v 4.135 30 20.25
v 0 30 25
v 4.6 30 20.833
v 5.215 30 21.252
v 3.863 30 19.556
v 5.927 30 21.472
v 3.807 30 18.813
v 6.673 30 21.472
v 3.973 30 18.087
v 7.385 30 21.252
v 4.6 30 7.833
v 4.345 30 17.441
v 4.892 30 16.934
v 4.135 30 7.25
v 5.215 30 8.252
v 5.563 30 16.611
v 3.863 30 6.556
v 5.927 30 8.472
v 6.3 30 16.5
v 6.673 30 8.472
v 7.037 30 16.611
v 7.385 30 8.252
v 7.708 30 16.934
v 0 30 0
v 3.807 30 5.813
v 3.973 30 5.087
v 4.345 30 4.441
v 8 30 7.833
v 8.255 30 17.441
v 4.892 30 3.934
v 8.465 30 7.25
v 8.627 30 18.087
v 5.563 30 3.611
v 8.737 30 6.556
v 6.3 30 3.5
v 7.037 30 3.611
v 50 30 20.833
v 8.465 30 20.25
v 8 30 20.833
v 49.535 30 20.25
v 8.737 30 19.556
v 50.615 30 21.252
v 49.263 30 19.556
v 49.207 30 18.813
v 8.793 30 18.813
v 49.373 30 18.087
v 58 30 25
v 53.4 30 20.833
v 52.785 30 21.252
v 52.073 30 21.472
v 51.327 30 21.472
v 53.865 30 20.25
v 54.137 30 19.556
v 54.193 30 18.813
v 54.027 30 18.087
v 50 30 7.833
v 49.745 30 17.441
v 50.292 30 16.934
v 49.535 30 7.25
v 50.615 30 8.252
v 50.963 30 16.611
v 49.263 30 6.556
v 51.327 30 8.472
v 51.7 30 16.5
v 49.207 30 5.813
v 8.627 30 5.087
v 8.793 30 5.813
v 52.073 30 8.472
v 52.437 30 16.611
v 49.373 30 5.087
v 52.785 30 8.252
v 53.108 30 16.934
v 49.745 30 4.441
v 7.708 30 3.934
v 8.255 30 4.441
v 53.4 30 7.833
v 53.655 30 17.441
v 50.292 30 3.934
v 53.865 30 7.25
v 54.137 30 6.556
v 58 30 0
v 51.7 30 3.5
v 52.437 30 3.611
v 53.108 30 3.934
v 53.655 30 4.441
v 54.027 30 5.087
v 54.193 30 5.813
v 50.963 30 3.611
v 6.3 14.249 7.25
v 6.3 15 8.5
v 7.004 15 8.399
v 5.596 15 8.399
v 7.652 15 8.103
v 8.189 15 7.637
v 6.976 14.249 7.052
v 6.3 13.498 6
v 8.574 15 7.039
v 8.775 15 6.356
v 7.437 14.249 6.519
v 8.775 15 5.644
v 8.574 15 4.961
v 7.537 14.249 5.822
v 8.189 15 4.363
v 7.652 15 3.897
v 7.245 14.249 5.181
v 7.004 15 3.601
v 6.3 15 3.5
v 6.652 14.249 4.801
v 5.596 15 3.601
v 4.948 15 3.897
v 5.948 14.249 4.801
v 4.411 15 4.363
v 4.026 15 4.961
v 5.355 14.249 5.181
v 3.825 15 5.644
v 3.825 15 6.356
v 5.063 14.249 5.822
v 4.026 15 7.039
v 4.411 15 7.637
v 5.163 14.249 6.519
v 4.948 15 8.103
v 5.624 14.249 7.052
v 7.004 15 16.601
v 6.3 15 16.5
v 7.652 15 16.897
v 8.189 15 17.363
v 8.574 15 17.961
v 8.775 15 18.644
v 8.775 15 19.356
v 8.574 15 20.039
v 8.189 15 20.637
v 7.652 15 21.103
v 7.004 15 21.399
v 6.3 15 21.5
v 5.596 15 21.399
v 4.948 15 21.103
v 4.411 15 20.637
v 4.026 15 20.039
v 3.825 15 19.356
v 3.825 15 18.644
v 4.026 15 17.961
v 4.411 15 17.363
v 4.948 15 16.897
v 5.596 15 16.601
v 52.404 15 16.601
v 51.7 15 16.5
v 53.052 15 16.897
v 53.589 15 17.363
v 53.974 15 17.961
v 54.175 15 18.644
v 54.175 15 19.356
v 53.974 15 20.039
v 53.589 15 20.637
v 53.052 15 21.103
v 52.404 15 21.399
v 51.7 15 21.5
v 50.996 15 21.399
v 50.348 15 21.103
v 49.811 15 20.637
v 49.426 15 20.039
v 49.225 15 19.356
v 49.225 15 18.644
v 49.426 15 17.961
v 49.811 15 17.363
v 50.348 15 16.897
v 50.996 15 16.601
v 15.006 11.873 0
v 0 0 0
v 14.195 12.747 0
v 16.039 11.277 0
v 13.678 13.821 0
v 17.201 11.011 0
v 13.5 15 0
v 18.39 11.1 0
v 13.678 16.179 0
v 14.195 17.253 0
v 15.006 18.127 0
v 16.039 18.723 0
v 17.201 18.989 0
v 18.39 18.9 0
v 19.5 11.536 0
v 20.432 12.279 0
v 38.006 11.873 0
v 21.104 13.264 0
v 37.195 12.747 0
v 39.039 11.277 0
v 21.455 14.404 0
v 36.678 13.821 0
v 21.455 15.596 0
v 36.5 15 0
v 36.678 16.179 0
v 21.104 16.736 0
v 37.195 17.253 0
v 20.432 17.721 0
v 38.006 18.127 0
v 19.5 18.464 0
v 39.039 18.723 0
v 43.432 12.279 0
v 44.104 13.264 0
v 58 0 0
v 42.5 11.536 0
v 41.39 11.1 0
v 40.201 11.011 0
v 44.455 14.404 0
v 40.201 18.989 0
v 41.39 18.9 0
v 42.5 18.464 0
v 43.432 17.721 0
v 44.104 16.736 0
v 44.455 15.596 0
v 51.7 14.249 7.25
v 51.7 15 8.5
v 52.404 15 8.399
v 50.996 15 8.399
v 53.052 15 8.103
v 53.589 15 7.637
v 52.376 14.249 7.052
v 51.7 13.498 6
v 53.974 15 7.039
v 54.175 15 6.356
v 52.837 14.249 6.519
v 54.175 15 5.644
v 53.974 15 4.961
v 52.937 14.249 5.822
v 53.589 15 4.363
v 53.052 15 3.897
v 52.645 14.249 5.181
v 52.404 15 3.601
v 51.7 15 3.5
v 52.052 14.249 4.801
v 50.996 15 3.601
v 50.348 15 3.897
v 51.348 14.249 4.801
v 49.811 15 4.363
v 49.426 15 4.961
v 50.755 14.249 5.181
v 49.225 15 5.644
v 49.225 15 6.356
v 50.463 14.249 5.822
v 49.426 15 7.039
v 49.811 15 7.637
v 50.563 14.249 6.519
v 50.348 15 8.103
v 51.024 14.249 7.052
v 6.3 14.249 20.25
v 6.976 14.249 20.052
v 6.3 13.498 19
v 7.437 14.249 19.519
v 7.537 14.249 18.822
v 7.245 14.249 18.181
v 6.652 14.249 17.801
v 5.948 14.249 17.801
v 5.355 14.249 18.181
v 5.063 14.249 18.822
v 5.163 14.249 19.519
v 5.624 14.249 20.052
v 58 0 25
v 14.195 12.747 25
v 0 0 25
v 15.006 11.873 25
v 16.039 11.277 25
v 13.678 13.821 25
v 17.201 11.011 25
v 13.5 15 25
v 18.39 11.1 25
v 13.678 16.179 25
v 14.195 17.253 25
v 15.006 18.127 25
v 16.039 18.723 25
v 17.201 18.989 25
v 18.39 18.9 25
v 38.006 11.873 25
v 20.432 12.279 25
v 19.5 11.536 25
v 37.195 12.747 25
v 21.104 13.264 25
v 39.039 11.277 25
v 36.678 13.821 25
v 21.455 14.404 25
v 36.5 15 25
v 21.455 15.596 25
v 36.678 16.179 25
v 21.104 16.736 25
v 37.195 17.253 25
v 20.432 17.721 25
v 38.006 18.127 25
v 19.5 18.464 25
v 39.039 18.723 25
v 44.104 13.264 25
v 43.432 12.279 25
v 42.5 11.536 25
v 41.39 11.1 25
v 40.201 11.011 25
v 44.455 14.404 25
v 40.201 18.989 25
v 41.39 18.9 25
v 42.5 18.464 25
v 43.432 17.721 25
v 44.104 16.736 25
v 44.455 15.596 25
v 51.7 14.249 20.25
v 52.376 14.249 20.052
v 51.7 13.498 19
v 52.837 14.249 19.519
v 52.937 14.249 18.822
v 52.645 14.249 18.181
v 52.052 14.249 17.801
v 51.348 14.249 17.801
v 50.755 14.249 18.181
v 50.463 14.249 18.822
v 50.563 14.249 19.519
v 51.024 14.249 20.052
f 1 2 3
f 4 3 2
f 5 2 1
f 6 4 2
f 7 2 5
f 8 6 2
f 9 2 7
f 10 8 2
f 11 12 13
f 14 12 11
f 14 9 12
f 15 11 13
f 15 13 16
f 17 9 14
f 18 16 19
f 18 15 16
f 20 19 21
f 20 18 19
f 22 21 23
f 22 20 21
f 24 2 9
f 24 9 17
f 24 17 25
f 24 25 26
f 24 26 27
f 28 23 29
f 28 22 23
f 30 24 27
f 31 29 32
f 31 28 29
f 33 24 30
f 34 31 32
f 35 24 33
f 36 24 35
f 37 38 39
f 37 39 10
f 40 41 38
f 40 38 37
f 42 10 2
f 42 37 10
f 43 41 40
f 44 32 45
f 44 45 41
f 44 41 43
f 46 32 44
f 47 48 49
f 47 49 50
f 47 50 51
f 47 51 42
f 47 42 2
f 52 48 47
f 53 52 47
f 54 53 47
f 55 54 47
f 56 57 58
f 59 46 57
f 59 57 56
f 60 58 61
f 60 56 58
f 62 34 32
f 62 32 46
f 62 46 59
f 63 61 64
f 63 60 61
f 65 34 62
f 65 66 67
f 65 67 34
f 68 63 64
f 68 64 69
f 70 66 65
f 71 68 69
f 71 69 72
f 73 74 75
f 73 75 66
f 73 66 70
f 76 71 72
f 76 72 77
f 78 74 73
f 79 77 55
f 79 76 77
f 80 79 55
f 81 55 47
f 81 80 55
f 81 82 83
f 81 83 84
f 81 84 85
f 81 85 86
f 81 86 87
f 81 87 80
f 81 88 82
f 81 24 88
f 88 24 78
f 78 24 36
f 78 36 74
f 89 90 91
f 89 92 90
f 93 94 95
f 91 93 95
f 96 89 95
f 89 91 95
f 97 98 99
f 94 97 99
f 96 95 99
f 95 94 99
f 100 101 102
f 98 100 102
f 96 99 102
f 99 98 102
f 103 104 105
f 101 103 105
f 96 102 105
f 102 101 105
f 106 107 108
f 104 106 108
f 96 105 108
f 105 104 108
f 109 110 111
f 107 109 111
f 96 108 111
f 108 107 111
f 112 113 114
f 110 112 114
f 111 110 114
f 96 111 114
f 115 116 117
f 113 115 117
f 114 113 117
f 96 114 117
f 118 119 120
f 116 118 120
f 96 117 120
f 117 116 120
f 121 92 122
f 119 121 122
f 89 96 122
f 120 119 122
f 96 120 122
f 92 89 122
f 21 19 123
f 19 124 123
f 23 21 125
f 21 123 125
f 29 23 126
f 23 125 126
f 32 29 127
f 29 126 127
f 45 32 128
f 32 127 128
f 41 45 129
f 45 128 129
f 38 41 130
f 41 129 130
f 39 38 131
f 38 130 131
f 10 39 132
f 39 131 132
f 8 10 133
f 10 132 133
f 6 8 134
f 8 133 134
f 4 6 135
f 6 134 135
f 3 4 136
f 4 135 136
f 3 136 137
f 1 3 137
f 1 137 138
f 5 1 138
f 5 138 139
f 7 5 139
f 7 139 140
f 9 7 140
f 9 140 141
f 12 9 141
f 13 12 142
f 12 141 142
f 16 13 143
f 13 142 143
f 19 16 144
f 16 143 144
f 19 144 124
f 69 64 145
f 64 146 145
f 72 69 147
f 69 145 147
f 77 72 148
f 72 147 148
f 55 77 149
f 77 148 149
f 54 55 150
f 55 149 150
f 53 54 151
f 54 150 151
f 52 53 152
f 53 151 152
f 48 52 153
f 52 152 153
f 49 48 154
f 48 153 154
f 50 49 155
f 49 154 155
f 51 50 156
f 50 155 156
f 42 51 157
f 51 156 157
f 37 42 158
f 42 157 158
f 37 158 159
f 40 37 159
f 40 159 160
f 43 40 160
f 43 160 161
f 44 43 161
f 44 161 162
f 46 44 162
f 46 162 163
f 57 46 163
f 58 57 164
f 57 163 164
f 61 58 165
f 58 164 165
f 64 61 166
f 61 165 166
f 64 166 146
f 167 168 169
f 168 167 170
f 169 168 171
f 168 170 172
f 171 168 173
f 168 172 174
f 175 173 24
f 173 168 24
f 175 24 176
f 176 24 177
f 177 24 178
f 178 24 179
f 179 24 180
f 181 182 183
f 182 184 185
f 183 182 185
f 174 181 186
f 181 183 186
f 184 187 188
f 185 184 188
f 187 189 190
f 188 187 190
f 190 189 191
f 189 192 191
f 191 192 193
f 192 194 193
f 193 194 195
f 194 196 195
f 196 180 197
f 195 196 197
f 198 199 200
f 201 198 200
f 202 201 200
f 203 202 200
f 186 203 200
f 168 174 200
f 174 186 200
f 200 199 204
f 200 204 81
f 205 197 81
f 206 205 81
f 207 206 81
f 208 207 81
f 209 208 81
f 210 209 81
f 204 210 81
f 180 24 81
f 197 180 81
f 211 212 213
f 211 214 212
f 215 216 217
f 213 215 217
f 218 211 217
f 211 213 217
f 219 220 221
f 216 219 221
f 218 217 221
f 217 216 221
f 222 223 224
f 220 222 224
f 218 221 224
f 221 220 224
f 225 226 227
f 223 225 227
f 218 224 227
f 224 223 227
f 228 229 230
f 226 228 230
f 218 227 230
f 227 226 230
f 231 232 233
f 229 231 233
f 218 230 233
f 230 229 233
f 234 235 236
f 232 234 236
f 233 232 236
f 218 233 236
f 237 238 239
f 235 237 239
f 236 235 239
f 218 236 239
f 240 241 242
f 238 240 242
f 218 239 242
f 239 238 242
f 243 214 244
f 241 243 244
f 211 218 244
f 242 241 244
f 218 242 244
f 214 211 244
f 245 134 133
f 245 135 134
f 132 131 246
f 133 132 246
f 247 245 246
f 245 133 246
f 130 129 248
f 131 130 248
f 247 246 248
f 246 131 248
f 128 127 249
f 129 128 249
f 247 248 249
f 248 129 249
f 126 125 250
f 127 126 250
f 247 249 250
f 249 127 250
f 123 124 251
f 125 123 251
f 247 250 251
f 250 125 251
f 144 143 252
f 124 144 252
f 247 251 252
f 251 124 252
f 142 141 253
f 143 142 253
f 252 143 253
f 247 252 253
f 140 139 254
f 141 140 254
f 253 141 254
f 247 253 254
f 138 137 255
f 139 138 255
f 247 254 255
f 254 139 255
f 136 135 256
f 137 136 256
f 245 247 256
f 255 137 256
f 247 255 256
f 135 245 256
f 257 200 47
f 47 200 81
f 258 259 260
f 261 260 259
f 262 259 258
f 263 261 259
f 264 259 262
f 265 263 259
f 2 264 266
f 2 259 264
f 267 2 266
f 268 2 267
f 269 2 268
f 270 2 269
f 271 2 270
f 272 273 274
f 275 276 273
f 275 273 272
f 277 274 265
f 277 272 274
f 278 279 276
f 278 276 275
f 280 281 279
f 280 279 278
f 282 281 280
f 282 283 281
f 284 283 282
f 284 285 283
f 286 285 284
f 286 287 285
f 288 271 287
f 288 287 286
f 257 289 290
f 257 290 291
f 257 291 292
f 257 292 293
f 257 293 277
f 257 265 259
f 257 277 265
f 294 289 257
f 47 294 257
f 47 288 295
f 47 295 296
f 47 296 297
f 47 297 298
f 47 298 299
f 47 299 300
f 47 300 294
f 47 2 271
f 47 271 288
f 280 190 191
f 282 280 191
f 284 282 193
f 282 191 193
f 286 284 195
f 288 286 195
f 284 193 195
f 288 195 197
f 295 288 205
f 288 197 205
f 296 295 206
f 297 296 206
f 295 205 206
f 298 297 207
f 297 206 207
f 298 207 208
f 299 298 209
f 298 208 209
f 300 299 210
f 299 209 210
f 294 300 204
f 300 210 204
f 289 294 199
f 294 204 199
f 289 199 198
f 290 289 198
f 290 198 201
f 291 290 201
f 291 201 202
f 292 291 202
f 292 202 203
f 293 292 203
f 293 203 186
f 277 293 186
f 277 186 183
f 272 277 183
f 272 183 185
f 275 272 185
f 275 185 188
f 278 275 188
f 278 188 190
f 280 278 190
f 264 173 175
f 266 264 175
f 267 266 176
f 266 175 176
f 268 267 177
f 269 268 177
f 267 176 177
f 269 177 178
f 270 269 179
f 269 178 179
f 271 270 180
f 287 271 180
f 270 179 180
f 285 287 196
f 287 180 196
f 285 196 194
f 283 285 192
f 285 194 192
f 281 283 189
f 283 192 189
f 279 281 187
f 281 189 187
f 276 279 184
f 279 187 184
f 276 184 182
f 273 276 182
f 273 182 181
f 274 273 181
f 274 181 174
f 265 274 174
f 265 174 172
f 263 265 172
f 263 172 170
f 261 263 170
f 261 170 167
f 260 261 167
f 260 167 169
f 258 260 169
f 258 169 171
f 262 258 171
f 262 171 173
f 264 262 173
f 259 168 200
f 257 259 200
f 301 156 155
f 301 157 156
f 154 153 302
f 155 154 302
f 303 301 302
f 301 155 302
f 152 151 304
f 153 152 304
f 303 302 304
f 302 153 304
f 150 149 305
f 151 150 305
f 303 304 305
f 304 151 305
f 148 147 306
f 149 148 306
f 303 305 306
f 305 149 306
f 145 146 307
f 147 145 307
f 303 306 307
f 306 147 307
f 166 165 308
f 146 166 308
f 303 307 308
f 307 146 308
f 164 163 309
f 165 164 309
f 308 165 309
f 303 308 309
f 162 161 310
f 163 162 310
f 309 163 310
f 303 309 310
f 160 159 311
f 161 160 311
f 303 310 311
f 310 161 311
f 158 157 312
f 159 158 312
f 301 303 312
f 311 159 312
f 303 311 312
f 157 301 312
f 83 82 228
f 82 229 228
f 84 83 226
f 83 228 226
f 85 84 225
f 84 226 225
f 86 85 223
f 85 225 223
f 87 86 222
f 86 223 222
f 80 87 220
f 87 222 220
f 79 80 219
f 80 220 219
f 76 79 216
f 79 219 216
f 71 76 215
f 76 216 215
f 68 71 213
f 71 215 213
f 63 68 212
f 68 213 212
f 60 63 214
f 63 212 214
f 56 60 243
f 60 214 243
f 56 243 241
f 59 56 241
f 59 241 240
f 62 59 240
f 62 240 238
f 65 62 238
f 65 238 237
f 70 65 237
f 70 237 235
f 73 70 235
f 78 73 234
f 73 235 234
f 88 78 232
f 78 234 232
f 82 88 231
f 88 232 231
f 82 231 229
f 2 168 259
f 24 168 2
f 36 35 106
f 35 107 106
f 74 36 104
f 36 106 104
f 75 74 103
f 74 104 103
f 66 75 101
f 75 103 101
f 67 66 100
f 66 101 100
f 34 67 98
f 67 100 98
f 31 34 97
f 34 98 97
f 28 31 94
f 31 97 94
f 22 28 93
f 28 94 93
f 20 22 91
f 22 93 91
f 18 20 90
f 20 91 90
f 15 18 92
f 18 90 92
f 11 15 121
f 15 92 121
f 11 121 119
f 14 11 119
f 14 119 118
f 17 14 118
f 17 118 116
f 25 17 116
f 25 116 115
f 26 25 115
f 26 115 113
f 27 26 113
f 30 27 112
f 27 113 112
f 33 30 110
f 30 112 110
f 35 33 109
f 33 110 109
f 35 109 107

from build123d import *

# Parameters (mm, degrees)
ESQUISSE1_W                                   = 58
ESQUISSE1_H                                   = 30
BOSS_EXTRU_1_DEPTH                            = 25
TROU_POUR_TARAUDAGE_POUR_TROU_TARAUD_M6_D     = 5
TROU_POUR_TARAUDAGE_POUR_TROU_TARAUD_M6_DEPTH = 15
TROU_POUR_TARAUDAGE_POUR_TROU_TARAUD_M6_TIP   = 1.502151548
DIAM_TRE_DU_PER_AGE_8_0_8_1_D                 = 8


with BuildPart() as part:
    # Esquisse1 → Boss.-Extru.1 (new body)
    with BuildSketch(Plane.XY):
        with Locations((29, 15)):
            Rectangle(ESQUISSE1_W, ESQUISSE1_H)
    extrude(amount=BOSS_EXTRU_1_DEPTH)

    # Trou pour taraudage pour trou taraudé M61
    with Locations(Plane(origin=(6.3, 30, 6), x_dir=(0, 0, 1), z_dir=(0, 1, 0))):
        with Locations((0, 0), (13, 0), (13, 45.4), (0, 45.4)):
            Hole(TROU_POUR_TARAUDAGE_POUR_TROU_TARAUD_M6_D / 2, depth=TROU_POUR_TARAUDAGE_POUR_TROU_TARAUD_M6_DEPTH)
            with Locations((0, 0, -(TROU_POUR_TARAUDAGE_POUR_TROU_TARAUD_M6_DEPTH + TROU_POUR_TARAUDAGE_POUR_TROU_TARAUD_M6_TIP / 2))):  # 118° drill point
                Cone(0, TROU_POUR_TARAUDAGE_POUR_TROU_TARAUD_M6_D / 2, TROU_POUR_TARAUDAGE_POUR_TROU_TARAUD_M6_TIP, mode=Mode.SUBTRACT)

    # Diamètre du perçage Ø8.0 (8)1 (through all)
    with Locations(Plane(origin=(17.5, 15, 25), x_dir=(1, 0, 0), z_dir=(0, 0, 1))):
        with Locations((0, 0), (23, 0)):
            Hole(DIAM_TRE_DU_PER_AGE_8_0_8_1_D / 2)


solid = part.part
